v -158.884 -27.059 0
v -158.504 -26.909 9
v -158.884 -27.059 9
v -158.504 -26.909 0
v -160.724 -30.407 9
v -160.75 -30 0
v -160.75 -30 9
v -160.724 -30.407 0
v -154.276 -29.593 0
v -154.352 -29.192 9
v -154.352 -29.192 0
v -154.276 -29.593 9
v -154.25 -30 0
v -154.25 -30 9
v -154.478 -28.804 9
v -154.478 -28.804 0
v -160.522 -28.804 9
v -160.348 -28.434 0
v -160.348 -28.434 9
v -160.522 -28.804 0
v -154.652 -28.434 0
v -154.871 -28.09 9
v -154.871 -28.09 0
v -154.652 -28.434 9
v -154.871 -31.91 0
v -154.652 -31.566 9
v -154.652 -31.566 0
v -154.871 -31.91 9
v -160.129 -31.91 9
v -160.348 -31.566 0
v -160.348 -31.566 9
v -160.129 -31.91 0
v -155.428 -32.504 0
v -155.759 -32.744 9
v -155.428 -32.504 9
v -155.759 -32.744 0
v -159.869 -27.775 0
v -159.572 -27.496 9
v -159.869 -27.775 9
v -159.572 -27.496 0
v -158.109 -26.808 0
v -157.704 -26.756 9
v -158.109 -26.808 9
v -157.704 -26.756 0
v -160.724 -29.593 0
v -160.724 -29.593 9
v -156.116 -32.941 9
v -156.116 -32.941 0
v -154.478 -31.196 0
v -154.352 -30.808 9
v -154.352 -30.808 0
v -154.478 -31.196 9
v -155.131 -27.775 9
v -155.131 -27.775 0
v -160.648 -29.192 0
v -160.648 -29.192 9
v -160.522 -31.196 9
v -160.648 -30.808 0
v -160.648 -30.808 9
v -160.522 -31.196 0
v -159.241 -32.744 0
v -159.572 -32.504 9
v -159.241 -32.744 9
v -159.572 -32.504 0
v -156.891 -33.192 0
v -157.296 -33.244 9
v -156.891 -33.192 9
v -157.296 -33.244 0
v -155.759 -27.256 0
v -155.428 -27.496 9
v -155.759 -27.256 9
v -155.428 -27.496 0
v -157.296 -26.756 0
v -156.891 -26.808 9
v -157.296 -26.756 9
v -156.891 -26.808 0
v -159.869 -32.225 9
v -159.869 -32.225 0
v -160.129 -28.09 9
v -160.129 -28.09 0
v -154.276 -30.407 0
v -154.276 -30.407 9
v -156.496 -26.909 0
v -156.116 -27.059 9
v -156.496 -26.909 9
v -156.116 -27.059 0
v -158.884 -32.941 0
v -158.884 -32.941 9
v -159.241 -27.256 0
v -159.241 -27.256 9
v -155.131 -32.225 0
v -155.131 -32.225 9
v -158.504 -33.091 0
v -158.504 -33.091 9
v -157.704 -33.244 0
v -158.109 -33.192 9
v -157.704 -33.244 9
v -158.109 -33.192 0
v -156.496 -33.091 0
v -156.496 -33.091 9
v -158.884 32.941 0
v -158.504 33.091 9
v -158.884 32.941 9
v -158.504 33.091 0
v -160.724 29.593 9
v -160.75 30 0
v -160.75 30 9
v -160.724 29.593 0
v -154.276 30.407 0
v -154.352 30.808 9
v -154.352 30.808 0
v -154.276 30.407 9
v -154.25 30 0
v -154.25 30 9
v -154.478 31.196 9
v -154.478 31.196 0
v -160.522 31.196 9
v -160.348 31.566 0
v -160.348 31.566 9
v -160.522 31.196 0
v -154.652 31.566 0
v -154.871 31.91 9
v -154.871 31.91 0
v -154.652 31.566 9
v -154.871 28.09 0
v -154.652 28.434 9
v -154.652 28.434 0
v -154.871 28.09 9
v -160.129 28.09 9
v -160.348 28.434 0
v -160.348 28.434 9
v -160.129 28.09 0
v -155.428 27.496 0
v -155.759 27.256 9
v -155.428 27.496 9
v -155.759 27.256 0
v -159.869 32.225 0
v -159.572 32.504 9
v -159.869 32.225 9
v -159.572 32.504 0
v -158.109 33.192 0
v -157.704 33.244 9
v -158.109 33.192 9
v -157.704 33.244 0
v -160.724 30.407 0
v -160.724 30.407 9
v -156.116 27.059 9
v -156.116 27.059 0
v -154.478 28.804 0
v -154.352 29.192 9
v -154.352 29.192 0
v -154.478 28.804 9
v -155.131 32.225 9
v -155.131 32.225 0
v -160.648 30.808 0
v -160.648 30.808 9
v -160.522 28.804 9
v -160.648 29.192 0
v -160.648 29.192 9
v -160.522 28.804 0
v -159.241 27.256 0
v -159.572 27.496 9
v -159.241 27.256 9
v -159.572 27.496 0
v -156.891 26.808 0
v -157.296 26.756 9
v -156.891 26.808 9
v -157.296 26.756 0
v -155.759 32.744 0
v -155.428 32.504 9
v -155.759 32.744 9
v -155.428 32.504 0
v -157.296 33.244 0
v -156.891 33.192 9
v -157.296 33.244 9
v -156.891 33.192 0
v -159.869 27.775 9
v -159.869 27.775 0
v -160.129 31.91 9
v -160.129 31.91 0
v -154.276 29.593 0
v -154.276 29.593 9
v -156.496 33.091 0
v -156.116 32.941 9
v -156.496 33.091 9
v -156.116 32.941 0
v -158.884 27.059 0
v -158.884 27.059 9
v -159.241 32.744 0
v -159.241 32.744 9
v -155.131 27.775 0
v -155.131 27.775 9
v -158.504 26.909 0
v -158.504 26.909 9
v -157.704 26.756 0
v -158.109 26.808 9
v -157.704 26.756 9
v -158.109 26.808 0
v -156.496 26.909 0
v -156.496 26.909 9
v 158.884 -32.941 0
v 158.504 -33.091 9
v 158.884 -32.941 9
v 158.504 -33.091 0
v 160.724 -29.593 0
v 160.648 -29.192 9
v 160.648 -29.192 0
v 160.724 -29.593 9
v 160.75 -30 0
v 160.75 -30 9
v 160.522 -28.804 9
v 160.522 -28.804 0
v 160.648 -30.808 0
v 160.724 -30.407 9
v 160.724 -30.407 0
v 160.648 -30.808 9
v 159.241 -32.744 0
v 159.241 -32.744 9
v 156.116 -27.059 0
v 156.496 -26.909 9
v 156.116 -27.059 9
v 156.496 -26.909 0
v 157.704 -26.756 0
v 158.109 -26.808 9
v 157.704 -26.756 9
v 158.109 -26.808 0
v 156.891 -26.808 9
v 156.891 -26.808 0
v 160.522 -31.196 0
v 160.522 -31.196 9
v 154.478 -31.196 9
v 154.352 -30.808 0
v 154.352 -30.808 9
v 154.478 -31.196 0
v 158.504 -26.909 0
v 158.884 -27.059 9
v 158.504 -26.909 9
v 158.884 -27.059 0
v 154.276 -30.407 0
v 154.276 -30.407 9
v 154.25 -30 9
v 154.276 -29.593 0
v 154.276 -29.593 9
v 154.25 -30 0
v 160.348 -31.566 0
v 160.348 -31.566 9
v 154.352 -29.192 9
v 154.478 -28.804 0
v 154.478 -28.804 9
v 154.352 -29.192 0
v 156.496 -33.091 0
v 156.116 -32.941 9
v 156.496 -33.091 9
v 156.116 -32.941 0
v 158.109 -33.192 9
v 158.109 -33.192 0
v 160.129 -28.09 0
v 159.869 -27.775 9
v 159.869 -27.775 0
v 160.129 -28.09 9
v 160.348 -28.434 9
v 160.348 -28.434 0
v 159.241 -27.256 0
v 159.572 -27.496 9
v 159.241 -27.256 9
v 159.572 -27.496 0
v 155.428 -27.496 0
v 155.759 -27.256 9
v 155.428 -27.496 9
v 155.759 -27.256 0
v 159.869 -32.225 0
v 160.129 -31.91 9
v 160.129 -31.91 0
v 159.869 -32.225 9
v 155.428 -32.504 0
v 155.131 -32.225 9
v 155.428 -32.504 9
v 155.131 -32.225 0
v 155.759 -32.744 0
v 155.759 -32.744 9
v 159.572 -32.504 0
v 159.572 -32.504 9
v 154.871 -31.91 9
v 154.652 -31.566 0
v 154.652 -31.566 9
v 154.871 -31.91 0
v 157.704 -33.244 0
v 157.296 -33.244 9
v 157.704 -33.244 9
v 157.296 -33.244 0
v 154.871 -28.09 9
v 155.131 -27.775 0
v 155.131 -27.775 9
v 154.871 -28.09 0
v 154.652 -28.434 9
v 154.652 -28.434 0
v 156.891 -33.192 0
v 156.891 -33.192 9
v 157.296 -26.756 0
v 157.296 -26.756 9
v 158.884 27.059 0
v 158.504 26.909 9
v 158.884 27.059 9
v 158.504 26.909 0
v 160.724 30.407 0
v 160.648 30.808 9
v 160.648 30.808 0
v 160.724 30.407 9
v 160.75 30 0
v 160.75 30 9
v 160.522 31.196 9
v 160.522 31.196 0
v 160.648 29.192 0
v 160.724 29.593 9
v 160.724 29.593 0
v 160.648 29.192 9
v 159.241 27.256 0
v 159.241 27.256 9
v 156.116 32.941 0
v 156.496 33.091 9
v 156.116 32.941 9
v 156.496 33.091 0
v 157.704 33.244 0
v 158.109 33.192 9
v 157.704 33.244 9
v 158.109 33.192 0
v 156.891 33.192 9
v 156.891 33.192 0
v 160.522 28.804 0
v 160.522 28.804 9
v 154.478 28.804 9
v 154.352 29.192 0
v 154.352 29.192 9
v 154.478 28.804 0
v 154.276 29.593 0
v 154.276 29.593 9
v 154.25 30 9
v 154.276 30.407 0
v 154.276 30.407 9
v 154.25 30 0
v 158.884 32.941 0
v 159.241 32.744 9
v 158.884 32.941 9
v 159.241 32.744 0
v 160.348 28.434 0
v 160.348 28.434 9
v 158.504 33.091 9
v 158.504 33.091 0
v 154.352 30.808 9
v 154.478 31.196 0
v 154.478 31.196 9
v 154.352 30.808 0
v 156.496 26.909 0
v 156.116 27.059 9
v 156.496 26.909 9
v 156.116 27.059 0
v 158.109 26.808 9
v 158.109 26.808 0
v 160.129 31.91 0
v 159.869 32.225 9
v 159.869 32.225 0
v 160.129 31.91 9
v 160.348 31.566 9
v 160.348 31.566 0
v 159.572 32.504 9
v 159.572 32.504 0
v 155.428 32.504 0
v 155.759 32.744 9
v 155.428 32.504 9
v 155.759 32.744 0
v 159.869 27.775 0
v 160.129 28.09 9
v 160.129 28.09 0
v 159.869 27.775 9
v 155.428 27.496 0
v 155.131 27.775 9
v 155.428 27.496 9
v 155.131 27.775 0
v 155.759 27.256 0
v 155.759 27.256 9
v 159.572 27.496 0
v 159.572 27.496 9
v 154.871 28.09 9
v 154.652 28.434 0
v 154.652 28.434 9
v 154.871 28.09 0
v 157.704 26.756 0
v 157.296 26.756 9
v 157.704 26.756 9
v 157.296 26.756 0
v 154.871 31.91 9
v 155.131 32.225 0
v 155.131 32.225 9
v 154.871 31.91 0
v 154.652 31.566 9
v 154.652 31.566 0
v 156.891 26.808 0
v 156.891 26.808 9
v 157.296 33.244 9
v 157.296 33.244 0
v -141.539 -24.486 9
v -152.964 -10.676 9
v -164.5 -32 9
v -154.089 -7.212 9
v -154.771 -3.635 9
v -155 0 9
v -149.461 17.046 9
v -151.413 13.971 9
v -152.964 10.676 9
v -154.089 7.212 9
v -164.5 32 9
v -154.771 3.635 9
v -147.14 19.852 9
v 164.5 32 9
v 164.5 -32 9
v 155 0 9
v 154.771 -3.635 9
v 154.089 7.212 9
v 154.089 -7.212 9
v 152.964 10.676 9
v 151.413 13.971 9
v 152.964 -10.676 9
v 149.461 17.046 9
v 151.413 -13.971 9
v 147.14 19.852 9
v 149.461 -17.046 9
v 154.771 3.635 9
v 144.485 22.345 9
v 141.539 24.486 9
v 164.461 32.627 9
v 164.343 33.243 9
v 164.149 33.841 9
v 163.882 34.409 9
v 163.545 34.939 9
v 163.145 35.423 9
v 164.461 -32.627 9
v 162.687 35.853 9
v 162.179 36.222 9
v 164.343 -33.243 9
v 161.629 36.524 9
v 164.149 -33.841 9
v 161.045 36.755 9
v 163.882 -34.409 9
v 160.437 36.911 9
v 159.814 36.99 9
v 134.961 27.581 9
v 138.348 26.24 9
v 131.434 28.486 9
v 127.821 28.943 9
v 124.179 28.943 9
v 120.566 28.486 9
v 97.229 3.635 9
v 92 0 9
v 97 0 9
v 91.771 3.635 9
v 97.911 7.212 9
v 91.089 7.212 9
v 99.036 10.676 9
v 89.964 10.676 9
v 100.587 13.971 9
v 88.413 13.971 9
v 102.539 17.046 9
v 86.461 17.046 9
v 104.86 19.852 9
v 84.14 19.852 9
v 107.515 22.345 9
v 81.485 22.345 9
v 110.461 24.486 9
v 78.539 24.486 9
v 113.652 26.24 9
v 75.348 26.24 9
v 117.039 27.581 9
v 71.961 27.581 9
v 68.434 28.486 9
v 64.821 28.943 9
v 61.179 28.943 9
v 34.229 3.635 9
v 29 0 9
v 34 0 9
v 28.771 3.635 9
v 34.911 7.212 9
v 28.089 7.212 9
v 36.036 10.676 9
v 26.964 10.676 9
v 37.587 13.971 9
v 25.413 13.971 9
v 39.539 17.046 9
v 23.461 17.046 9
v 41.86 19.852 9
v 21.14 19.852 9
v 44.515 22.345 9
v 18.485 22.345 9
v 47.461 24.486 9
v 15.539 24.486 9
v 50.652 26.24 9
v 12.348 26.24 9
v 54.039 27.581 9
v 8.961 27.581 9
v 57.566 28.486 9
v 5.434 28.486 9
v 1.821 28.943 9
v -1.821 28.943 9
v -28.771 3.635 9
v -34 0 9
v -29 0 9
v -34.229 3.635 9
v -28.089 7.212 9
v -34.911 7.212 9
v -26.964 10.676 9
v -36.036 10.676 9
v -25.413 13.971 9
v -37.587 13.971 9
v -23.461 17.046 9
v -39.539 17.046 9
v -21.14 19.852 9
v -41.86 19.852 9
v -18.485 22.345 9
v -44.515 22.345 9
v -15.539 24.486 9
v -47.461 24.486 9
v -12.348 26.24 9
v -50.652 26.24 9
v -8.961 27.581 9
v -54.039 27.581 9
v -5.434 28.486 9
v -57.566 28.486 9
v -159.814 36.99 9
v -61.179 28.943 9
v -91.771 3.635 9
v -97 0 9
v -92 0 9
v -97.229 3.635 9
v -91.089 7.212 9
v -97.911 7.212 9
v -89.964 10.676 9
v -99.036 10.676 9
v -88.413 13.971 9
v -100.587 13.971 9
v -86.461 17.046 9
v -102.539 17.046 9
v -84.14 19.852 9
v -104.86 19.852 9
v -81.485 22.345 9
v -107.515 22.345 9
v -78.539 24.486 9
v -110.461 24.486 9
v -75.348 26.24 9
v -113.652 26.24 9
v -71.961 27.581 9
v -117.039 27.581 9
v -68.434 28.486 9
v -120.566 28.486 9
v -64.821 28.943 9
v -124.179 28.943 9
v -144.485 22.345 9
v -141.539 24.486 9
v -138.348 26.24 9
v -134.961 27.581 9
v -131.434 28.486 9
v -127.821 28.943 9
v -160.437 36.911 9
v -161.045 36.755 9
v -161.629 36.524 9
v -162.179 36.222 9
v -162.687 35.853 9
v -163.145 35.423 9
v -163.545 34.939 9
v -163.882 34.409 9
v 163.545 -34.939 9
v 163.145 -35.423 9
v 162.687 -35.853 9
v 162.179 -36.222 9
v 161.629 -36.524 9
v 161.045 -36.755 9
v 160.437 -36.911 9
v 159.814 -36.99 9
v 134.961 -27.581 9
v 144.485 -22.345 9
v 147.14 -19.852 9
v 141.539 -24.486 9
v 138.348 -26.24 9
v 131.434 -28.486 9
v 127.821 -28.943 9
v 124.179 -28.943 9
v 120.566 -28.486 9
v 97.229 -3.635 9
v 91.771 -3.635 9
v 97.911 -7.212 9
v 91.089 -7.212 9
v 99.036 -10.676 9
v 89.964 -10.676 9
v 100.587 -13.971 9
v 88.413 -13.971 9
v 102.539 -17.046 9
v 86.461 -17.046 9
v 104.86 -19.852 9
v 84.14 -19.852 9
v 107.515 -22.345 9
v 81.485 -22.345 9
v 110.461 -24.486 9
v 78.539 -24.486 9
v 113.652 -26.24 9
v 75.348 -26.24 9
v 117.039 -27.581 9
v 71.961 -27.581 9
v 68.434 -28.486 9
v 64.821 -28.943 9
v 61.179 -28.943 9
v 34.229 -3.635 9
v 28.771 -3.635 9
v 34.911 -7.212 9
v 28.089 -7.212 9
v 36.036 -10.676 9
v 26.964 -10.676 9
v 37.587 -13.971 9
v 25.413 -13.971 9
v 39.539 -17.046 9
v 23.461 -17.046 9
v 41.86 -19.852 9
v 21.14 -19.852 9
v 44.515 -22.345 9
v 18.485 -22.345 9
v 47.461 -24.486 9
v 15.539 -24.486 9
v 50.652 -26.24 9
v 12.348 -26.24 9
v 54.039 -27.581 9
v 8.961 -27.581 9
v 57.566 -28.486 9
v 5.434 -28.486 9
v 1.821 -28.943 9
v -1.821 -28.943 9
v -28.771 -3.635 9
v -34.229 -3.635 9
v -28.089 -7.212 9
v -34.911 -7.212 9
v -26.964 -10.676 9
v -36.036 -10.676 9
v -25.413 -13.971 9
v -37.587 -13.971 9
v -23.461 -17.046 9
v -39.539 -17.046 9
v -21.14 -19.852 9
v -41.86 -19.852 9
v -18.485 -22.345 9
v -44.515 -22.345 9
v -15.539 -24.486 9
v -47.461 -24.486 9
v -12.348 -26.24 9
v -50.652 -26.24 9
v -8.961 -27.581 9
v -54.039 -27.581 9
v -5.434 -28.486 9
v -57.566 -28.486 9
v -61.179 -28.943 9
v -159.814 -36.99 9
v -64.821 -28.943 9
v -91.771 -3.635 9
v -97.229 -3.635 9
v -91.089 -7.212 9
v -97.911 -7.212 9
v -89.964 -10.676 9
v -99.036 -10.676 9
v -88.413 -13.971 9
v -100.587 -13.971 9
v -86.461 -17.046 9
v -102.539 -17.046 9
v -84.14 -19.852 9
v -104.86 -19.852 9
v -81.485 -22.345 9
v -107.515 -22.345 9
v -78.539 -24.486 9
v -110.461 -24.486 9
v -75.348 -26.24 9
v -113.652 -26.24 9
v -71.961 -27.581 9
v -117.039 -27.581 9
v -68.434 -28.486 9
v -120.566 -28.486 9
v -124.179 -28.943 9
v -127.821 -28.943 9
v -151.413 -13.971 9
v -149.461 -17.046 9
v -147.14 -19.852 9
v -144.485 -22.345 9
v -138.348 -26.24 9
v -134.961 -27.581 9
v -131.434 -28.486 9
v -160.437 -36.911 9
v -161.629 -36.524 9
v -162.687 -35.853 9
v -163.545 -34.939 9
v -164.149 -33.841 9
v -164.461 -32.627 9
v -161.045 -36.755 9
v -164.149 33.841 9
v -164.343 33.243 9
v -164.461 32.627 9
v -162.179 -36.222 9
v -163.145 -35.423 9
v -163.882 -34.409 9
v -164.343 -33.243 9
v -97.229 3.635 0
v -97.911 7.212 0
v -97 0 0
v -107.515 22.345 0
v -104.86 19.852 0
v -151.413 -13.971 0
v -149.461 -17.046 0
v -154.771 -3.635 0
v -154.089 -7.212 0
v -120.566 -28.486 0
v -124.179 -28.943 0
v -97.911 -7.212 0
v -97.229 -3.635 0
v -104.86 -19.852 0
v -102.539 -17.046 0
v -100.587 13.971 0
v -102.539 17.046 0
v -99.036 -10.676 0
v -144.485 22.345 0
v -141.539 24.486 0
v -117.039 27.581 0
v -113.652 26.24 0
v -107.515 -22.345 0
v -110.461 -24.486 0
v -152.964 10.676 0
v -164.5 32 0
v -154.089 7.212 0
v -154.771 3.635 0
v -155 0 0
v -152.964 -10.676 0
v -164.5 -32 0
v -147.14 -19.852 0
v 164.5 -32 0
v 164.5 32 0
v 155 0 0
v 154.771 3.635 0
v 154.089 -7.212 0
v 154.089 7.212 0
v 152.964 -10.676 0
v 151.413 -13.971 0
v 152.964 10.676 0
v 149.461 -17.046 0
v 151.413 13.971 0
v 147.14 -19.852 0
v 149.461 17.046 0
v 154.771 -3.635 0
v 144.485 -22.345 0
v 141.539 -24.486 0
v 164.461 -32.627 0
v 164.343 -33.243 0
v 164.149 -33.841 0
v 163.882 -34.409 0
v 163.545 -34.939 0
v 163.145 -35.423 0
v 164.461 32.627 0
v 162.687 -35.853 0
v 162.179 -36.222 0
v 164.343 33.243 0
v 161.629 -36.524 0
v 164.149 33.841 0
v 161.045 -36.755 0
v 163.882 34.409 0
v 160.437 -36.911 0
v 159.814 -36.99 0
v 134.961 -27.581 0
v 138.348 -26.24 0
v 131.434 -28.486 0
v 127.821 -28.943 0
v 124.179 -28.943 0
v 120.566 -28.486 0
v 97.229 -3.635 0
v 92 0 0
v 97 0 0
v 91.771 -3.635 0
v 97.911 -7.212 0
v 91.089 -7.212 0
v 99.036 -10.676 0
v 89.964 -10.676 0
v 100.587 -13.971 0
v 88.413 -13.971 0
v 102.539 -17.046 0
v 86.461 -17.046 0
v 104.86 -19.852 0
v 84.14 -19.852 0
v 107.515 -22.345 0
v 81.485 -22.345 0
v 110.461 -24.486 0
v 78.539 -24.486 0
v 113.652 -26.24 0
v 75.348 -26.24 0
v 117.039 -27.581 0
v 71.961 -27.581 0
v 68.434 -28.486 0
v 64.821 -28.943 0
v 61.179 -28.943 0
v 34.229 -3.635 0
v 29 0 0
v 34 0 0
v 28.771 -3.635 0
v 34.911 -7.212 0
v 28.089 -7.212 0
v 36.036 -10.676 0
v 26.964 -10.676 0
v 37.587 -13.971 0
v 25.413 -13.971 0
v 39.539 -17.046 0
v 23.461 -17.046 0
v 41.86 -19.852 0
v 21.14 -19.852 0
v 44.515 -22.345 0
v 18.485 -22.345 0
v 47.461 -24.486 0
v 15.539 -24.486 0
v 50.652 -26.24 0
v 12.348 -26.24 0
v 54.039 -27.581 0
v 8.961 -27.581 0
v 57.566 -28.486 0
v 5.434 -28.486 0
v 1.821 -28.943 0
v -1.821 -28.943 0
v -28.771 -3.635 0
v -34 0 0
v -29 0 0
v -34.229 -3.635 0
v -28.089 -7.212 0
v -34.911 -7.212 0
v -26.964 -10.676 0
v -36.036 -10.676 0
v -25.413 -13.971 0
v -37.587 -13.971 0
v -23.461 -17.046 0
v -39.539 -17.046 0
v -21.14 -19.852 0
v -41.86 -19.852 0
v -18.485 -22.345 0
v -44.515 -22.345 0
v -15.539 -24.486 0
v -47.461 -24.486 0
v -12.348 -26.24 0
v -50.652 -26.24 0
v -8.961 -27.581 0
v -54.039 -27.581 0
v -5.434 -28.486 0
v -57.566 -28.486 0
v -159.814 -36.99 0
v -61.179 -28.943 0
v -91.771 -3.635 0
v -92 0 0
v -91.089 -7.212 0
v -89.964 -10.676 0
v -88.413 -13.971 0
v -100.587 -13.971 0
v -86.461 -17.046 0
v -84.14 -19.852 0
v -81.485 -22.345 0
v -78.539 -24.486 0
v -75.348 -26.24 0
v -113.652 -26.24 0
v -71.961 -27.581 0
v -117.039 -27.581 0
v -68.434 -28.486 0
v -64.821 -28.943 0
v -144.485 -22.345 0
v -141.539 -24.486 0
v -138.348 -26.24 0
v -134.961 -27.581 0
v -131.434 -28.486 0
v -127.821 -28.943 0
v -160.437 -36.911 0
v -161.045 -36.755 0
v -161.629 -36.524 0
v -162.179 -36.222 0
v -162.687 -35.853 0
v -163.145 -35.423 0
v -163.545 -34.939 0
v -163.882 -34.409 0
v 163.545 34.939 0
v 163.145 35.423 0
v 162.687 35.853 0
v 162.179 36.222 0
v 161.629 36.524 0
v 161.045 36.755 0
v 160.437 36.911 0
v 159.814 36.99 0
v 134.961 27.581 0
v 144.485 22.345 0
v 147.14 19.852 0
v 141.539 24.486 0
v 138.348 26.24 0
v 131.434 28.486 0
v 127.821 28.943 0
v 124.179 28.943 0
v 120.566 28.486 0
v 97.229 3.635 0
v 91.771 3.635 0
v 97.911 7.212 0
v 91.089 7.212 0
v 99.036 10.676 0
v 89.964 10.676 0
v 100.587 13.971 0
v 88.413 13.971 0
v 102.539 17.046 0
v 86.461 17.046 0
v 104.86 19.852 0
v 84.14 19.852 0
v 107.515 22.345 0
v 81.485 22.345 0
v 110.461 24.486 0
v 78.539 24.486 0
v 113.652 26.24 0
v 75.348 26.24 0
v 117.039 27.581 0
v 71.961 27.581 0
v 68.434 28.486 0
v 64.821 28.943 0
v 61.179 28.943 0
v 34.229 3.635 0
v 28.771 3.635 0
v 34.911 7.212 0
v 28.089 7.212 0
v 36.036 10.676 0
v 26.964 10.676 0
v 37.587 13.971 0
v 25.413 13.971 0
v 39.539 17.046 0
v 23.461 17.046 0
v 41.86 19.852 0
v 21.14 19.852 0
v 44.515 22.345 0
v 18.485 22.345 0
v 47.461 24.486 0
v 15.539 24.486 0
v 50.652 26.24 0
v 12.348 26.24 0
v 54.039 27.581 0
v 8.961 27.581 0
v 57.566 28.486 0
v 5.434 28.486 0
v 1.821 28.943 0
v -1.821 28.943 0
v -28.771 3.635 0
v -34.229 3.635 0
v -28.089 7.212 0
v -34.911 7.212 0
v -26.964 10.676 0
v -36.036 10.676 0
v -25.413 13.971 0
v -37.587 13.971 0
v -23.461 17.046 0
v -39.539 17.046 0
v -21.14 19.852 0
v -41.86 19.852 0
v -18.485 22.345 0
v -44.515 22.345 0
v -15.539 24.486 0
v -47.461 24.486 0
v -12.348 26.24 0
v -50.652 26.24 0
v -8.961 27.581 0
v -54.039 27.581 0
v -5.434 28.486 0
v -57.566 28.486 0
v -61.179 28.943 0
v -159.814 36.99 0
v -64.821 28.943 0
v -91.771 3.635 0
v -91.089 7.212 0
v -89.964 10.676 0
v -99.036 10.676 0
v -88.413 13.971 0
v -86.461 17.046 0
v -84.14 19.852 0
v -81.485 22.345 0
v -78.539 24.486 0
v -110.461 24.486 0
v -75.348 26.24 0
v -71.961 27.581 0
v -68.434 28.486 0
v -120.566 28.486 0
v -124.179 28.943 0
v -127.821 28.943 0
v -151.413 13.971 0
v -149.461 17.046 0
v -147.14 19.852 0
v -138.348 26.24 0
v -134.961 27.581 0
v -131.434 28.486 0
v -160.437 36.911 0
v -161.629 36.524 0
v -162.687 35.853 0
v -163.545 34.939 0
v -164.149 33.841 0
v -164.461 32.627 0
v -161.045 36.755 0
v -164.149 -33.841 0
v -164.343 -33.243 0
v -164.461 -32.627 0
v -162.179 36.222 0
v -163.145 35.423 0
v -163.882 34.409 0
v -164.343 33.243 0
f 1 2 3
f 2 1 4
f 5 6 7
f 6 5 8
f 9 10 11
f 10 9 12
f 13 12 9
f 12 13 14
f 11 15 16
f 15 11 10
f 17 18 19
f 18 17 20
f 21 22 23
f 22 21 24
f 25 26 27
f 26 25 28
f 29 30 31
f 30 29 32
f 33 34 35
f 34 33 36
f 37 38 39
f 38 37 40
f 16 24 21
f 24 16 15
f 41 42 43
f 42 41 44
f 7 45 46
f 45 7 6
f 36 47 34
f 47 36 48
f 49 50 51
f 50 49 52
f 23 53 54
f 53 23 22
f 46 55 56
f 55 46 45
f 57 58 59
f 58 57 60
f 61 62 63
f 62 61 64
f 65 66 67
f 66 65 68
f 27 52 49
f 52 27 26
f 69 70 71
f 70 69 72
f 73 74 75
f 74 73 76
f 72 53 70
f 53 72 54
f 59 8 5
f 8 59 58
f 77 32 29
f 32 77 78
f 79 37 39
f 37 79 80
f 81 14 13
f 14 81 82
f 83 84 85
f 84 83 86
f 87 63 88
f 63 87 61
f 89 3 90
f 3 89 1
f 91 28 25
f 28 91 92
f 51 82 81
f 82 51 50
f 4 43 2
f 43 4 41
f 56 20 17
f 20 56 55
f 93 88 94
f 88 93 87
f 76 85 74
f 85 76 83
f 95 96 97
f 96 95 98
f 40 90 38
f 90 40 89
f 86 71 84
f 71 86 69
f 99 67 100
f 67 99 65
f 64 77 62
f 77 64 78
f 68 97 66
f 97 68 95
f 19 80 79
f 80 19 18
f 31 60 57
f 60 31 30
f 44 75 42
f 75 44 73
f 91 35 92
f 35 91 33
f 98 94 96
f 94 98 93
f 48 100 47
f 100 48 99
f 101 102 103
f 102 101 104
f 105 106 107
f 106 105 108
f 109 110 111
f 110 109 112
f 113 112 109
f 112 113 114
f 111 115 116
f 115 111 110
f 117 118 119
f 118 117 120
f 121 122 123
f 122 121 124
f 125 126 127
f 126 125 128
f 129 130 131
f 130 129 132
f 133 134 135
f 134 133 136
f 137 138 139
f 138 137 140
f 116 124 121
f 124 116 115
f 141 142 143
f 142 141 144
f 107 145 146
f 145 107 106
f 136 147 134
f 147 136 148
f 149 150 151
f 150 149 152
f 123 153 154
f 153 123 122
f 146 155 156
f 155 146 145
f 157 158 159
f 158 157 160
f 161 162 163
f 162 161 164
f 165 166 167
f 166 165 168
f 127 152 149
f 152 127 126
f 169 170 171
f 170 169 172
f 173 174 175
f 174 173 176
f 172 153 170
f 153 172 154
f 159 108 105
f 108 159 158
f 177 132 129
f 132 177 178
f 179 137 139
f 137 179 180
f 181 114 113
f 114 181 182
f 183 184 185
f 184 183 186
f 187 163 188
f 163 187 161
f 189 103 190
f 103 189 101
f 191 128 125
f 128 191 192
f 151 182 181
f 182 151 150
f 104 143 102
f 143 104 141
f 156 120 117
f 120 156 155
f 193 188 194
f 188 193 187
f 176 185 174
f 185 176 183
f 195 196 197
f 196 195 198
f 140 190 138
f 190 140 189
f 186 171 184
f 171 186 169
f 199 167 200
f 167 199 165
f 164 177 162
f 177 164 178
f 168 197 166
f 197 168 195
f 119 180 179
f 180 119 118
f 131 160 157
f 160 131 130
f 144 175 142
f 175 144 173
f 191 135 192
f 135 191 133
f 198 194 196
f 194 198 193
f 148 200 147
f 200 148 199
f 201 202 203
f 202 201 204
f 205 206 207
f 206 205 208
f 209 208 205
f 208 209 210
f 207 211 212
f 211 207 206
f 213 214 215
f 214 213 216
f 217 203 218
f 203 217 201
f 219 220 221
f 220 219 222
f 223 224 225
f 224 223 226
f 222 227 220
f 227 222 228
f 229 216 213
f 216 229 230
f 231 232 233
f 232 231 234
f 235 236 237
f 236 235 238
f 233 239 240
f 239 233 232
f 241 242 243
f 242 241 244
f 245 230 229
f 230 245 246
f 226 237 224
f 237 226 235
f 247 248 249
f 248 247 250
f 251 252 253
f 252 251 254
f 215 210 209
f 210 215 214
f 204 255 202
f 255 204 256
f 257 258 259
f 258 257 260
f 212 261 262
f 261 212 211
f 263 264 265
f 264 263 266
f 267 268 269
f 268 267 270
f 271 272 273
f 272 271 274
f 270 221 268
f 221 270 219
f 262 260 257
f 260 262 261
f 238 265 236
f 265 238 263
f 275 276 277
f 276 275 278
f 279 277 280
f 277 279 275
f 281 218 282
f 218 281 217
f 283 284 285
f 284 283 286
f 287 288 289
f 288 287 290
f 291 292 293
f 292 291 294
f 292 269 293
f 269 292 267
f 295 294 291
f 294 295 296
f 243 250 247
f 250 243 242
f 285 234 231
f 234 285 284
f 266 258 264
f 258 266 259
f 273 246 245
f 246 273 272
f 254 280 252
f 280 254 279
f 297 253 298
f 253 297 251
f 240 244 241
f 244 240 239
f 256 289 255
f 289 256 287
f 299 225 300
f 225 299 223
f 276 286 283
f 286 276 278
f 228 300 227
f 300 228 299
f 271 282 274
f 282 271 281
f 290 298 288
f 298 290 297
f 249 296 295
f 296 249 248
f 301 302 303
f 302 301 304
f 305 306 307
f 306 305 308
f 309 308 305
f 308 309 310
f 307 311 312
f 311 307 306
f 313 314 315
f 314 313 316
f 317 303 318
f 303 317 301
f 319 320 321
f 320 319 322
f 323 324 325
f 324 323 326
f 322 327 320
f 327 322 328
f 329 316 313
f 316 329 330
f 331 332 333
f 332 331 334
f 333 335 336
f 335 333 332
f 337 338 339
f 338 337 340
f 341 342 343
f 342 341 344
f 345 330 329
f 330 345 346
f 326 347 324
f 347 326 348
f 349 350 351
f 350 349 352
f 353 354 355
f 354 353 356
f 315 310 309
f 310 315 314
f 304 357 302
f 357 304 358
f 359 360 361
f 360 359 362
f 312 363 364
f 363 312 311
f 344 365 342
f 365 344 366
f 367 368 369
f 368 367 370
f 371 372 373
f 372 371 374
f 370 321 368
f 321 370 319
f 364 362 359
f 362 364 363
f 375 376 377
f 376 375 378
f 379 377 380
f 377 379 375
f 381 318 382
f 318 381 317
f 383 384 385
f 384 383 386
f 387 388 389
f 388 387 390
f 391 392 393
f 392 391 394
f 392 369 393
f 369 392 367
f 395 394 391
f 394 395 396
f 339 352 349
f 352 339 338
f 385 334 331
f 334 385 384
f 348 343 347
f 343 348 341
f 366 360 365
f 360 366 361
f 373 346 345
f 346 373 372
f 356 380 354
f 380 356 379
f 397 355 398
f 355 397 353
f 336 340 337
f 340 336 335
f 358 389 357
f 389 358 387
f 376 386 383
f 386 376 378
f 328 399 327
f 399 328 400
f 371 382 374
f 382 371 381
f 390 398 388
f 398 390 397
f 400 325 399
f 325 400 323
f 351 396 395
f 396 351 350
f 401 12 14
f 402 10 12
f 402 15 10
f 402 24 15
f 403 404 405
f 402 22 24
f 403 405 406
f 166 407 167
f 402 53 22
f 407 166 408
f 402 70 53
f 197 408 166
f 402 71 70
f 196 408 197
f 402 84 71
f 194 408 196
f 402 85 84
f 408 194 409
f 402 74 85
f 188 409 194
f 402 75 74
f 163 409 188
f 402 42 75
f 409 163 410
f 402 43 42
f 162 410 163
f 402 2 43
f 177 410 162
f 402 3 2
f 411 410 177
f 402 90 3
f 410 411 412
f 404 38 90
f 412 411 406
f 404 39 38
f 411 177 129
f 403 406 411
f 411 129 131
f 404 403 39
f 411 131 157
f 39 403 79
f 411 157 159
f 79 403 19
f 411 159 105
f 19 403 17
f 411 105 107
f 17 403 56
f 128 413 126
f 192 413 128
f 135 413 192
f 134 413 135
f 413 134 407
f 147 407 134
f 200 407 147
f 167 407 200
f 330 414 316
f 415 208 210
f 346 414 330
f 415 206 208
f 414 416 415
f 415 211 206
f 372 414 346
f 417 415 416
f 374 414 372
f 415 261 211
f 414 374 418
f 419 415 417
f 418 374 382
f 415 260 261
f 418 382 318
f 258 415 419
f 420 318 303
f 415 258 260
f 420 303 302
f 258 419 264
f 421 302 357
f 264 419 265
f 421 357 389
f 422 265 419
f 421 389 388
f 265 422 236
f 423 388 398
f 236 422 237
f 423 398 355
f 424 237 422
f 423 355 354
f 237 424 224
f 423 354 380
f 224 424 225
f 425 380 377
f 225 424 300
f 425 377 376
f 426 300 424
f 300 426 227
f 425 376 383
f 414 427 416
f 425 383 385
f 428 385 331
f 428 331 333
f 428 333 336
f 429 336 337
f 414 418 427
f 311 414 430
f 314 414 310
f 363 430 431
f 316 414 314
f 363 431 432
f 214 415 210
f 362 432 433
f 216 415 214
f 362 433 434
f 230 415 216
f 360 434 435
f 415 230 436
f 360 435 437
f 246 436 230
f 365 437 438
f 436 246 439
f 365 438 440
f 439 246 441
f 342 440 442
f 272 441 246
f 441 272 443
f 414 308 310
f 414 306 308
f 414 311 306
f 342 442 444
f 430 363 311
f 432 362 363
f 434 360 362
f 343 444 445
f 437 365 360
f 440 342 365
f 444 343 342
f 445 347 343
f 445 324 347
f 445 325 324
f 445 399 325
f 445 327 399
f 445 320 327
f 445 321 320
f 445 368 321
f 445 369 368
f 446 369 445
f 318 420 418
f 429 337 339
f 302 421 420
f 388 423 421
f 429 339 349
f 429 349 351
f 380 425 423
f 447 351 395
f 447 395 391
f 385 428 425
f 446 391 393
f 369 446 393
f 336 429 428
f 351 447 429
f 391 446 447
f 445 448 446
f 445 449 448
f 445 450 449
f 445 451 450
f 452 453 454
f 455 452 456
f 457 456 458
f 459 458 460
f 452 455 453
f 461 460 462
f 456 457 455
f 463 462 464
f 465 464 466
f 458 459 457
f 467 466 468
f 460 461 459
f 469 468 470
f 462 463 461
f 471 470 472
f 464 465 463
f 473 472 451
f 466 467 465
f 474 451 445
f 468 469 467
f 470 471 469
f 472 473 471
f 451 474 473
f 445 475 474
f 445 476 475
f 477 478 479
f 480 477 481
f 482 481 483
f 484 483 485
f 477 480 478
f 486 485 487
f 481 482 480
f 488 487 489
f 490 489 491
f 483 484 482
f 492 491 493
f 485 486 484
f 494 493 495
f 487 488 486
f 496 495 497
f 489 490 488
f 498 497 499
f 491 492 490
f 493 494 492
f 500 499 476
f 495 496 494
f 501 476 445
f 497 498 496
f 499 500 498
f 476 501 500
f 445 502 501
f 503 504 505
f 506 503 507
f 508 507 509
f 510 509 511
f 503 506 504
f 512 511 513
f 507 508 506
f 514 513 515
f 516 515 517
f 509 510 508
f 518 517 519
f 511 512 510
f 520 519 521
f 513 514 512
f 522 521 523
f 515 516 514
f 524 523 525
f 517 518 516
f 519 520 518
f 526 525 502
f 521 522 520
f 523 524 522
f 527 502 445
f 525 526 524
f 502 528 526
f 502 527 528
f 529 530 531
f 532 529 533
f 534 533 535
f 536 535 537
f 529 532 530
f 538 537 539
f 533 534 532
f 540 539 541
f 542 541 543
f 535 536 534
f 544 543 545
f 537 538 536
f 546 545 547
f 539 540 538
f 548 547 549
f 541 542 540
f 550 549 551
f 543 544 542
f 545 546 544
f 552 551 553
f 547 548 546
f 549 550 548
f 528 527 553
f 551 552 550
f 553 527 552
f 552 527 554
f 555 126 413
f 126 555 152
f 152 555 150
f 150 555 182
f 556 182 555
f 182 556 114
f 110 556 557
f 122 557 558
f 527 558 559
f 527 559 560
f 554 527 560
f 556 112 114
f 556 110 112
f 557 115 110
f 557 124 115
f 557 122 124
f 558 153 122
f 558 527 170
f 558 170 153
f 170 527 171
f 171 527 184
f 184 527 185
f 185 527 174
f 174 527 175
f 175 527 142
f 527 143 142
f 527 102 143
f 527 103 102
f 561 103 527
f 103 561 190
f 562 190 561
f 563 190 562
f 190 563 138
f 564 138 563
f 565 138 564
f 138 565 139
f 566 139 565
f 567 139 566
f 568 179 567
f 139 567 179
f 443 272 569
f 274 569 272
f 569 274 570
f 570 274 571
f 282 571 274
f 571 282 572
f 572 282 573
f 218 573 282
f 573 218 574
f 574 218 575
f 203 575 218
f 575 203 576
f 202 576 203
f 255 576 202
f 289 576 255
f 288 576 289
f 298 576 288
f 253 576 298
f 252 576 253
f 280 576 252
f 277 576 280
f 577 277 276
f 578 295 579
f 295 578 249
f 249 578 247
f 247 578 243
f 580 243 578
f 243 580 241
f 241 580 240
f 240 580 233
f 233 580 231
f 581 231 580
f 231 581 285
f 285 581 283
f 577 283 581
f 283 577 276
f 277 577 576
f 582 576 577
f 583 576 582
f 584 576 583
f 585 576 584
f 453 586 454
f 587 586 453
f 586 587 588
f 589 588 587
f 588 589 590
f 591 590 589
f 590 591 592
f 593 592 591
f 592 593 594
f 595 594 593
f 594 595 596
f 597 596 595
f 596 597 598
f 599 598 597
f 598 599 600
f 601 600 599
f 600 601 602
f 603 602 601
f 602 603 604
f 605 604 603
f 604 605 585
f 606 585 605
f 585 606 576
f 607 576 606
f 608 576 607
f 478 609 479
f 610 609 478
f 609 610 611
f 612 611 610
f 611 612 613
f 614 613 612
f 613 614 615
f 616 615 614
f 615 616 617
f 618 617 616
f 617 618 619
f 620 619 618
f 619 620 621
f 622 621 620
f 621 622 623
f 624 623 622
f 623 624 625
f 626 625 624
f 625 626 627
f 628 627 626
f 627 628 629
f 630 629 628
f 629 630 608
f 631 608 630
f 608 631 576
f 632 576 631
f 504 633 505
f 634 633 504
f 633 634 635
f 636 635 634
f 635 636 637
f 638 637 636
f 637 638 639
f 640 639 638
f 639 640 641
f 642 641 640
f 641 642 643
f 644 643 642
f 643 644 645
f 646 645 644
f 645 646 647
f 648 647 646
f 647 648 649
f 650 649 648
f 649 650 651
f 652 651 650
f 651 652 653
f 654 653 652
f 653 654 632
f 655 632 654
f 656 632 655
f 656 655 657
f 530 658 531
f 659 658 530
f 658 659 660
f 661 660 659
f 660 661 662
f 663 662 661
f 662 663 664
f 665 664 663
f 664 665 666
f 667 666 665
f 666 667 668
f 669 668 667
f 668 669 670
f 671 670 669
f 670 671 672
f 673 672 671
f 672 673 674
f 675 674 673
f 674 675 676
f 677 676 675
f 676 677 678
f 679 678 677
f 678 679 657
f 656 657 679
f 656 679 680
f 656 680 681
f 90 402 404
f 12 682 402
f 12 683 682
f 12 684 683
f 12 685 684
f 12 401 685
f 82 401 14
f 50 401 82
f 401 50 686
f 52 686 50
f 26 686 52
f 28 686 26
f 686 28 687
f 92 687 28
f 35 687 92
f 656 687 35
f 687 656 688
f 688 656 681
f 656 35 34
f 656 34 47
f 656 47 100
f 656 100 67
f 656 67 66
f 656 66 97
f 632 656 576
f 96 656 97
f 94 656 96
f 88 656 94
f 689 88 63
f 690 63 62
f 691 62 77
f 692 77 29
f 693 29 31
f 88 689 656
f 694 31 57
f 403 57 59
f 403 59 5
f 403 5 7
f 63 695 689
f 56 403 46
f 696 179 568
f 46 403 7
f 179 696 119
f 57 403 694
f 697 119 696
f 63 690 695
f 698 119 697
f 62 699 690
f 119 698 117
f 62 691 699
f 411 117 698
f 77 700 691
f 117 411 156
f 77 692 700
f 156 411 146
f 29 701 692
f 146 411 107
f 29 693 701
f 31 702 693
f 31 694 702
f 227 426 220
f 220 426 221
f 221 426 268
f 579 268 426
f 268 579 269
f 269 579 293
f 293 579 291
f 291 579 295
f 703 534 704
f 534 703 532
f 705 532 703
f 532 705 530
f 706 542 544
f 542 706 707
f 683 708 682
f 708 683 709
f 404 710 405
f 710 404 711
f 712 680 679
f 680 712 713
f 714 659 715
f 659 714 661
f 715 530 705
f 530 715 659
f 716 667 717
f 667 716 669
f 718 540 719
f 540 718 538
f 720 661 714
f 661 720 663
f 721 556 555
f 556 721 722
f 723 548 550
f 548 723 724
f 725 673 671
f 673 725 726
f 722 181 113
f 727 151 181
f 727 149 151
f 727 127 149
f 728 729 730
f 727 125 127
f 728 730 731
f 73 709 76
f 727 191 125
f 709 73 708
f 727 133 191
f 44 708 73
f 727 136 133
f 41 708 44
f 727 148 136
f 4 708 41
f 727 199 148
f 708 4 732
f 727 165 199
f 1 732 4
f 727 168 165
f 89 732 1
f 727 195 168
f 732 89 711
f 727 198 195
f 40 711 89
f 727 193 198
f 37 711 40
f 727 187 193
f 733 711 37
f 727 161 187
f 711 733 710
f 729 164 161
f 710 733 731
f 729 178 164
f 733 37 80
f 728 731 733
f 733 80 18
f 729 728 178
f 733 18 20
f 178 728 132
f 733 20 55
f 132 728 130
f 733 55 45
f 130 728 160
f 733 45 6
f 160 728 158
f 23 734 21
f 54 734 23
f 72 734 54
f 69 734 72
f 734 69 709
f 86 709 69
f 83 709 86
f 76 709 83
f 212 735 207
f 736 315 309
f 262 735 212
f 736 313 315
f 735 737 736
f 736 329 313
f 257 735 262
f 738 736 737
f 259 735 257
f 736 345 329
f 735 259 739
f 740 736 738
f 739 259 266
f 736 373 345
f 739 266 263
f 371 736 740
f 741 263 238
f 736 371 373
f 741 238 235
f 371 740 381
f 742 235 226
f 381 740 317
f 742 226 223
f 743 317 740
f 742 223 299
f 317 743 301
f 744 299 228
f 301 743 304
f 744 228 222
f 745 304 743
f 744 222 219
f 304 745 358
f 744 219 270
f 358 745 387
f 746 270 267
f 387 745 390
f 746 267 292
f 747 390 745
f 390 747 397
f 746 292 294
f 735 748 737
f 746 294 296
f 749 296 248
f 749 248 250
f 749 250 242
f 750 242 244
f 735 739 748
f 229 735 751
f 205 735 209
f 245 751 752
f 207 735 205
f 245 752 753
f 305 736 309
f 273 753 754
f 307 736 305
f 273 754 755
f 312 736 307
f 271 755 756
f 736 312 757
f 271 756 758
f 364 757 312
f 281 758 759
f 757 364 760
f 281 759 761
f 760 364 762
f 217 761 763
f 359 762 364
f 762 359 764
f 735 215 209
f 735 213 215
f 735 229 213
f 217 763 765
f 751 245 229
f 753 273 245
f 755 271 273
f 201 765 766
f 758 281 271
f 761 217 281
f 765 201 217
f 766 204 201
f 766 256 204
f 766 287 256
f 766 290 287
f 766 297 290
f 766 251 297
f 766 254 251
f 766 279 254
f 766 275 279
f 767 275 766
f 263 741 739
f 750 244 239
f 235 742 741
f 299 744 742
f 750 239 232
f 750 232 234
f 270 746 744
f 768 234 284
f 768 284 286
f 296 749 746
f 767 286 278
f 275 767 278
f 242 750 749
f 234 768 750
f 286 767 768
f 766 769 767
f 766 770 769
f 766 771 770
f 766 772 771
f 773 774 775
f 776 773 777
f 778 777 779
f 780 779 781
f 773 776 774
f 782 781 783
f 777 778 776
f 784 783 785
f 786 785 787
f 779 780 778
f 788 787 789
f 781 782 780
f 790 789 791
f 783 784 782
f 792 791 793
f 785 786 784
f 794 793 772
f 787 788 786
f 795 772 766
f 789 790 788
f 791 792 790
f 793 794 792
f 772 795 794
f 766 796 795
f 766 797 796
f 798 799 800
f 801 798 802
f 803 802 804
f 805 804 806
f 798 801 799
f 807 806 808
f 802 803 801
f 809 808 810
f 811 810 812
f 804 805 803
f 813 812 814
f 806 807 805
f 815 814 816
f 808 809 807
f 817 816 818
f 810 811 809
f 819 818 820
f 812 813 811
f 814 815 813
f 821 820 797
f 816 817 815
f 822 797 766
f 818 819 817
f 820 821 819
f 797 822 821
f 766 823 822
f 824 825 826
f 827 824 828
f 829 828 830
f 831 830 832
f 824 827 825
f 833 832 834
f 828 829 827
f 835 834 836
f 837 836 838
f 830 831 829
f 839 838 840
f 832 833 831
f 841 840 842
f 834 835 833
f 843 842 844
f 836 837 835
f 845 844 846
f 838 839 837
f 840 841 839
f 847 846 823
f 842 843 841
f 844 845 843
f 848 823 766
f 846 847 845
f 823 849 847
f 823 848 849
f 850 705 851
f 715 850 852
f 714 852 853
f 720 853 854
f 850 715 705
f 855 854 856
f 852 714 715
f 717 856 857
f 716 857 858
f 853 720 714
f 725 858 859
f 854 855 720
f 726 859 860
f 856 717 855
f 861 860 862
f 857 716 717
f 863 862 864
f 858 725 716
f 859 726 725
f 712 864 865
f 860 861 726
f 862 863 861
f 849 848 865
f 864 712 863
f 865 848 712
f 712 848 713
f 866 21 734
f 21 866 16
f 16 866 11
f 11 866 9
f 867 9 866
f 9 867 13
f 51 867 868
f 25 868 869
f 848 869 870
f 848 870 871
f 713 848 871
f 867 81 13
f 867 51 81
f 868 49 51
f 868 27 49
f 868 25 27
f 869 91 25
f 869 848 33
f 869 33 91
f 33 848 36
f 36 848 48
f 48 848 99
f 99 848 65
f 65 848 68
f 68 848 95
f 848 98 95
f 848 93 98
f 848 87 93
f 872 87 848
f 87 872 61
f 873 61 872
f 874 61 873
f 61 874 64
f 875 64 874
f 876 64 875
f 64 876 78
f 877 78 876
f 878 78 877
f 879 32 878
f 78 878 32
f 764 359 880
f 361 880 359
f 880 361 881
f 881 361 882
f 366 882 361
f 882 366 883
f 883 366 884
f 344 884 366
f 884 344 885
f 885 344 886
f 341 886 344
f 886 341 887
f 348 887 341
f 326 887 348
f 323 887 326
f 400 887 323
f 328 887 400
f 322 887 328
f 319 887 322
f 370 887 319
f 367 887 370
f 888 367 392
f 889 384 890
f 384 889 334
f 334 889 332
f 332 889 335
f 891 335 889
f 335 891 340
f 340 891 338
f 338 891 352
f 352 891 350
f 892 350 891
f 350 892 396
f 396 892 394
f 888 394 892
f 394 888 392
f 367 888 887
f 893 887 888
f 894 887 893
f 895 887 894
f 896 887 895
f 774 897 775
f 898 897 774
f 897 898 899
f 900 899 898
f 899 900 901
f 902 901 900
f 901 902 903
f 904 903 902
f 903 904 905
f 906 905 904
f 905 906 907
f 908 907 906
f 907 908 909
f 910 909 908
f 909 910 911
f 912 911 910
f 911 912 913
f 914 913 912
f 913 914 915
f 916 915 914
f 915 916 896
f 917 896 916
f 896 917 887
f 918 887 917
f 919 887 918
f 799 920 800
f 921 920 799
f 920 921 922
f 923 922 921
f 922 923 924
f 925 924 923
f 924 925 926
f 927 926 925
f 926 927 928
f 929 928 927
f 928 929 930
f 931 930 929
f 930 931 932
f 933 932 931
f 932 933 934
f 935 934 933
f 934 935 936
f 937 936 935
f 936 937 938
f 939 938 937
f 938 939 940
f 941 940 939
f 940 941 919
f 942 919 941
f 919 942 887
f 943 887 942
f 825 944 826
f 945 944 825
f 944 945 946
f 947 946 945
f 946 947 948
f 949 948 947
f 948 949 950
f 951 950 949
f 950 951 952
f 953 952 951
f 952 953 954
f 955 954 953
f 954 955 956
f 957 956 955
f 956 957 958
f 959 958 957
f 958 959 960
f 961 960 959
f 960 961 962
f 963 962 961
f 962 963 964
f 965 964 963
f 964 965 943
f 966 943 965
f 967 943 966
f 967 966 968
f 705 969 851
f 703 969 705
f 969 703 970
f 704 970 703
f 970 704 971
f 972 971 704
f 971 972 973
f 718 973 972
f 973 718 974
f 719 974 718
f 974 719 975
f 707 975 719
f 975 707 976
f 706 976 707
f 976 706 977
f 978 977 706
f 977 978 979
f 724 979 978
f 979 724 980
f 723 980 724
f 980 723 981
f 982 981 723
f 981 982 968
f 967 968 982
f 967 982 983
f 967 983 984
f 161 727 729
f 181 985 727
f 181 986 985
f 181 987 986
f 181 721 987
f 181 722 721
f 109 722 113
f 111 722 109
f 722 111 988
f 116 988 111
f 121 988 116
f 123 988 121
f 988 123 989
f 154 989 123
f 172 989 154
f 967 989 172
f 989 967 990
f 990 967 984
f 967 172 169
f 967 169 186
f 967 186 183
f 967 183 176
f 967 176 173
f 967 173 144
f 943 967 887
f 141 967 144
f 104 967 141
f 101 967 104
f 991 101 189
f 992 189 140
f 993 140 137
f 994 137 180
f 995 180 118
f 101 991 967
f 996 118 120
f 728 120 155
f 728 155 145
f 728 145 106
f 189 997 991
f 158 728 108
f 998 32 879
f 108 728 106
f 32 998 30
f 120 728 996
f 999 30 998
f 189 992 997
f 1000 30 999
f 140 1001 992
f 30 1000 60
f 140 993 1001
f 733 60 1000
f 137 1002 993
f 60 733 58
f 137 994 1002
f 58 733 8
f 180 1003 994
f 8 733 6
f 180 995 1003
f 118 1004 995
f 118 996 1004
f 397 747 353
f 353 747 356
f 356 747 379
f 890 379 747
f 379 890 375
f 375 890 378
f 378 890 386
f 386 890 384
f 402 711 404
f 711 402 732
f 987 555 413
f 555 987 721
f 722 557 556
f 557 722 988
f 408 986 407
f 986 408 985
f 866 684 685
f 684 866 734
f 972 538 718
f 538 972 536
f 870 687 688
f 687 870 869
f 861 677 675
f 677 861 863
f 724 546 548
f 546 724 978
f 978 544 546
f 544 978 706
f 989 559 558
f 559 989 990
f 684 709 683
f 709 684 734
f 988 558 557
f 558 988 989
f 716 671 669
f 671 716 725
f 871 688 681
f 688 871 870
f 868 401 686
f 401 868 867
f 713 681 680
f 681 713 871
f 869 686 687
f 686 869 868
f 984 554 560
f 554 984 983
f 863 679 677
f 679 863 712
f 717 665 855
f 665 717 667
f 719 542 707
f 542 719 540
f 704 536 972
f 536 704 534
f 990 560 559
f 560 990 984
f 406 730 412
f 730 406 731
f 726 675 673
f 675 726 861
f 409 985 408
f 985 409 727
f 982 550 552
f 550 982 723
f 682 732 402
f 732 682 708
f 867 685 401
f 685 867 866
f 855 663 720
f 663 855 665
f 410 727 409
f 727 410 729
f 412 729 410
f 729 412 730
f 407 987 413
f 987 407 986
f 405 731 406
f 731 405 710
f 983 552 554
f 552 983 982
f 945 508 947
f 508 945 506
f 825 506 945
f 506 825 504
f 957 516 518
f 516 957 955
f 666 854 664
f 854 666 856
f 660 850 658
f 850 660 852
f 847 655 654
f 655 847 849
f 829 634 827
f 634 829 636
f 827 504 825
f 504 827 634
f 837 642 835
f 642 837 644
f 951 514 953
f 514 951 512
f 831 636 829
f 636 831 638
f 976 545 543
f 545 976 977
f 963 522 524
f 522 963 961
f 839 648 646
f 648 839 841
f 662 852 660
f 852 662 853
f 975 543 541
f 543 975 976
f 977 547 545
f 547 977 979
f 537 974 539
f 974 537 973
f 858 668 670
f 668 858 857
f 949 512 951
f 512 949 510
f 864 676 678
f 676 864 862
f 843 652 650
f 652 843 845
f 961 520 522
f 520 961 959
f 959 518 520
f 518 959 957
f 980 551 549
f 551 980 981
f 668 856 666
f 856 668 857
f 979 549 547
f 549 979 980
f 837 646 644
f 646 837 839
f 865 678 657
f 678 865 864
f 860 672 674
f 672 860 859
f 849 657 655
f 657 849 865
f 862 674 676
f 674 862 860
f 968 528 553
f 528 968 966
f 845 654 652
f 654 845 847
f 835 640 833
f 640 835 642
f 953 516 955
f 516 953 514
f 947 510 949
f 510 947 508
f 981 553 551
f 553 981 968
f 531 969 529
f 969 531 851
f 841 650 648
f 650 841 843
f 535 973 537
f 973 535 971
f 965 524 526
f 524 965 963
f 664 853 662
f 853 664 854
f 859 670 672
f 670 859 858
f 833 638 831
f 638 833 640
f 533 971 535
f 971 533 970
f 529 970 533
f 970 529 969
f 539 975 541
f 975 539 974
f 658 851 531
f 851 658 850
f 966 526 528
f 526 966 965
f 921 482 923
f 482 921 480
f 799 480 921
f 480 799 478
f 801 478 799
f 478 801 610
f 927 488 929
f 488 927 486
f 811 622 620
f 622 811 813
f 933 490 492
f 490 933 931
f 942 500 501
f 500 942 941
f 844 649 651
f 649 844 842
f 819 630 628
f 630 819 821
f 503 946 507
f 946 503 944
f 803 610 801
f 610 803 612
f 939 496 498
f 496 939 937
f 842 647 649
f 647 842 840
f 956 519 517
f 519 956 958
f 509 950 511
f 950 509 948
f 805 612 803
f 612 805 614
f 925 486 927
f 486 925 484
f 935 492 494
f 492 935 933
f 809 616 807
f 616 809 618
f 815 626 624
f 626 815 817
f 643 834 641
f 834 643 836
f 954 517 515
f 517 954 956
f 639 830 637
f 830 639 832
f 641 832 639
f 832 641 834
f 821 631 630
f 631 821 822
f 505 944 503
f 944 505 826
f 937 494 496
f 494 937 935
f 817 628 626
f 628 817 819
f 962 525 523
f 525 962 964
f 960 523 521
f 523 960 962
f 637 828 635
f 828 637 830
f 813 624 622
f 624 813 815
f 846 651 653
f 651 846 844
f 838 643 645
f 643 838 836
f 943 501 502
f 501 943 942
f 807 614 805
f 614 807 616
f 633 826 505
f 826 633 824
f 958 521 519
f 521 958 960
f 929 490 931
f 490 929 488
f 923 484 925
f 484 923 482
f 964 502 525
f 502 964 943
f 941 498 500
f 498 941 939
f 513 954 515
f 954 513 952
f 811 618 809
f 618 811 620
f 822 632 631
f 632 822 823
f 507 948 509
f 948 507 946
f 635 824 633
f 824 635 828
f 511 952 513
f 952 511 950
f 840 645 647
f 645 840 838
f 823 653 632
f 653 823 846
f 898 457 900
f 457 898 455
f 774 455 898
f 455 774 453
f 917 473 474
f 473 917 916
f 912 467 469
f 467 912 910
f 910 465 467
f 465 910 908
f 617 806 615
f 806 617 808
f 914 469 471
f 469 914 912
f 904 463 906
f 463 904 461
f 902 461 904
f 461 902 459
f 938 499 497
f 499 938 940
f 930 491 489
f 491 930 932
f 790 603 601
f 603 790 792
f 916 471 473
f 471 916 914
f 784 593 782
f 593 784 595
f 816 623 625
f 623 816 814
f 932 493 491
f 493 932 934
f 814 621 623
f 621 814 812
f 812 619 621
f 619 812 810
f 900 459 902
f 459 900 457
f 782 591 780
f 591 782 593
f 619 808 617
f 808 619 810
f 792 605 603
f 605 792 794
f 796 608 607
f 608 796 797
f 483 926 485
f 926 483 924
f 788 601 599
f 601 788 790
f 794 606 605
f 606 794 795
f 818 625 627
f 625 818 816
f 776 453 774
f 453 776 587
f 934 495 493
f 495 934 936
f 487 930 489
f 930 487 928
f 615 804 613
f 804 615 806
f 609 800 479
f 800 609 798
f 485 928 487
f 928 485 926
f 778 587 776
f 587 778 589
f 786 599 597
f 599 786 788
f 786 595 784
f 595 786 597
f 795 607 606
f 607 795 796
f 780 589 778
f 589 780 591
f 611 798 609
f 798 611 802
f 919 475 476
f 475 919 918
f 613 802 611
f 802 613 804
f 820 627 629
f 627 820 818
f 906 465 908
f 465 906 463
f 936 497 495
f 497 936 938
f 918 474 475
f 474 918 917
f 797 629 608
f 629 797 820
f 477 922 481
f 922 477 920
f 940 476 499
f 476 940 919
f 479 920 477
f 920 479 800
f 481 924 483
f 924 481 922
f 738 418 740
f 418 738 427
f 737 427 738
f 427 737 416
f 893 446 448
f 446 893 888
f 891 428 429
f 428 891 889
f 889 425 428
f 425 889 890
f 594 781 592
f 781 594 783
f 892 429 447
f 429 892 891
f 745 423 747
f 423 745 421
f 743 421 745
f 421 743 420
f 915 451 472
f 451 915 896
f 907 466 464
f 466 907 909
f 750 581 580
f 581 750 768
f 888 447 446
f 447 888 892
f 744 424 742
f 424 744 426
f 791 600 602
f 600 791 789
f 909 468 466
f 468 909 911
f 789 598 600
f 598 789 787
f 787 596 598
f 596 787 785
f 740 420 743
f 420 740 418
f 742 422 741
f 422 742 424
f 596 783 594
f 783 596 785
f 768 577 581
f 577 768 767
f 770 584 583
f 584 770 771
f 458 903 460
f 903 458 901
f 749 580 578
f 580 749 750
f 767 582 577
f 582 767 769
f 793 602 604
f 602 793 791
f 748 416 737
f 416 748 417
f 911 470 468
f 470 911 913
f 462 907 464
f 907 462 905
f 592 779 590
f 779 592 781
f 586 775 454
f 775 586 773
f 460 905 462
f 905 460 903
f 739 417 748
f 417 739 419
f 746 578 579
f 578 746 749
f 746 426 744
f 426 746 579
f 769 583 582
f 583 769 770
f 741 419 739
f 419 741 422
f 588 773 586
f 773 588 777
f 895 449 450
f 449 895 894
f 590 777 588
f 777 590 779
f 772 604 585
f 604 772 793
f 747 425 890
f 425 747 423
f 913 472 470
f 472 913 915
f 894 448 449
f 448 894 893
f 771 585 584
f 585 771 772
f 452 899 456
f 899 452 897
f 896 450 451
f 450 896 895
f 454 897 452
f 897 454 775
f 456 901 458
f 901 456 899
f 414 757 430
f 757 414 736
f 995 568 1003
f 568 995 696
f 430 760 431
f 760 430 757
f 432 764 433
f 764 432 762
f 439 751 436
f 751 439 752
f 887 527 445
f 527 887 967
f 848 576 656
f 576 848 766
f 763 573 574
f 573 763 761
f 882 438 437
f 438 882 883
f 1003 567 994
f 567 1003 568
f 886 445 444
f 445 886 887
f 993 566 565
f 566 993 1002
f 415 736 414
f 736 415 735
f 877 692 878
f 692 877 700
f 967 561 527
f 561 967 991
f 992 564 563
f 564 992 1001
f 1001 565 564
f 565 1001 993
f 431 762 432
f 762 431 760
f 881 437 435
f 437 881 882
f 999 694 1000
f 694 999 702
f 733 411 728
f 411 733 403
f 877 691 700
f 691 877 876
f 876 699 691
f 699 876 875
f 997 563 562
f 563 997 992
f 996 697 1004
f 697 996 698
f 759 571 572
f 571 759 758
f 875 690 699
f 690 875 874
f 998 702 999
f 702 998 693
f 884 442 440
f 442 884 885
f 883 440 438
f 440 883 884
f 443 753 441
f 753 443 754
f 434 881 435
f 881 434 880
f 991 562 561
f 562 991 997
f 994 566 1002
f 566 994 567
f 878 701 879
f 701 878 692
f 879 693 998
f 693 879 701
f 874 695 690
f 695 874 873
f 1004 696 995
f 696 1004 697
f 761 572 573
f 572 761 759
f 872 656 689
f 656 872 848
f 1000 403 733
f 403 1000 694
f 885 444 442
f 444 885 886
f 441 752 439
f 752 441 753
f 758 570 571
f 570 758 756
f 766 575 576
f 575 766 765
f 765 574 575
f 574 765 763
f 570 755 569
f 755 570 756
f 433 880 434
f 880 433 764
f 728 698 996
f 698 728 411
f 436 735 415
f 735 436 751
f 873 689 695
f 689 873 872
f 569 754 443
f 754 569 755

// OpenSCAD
$fn = 50;


difference() {
	union() {
		hull() {
			translate(v = [-159.5000000000, 32.0000000000, 0]) {
				cylinder(h = 9, r = 5);
			}
			translate(v = [159.5000000000, 32.0000000000, 0]) {
				cylinder(h = 9, r = 5);
			}
			translate(v = [-159.5000000000, -32.0000000000, 0]) {
				cylinder(h = 9, r = 5);
			}
			translate(v = [159.5000000000, -32.0000000000, 0]) {
				cylinder(h = 9, r = 5);
			}
		}
	}
	union() {
		#translate(v = [-157.5000000000, -30.0000000000, -100.0000000000]) {
			cylinder(h = 200, r = 3.2500000000);
		}
		#translate(v = [-157.5000000000, 30.0000000000, -100.0000000000]) {
			cylinder(h = 200, r = 3.2500000000);
		}
		#translate(v = [157.5000000000, -30.0000000000, -100.0000000000]) {
			cylinder(h = 200, r = 3.2500000000);
		}
		#translate(v = [157.5000000000, 30.0000000000, -100.0000000000]) {
			cylinder(h = 200, r = 3.2500000000);
		}
		#translate(v = [-126.0000000000, 0, 0]) {
			cylinder(h = 9, r = 29.0000000000);
		}
		#translate(v = [-63.0000000000, 0, 0]) {
			cylinder(h = 9, r = 29.0000000000);
		}
		#cylinder(h = 9, r = 29.0000000000);
		#translate(v = [63.0000000000, 0, 0]) {
			cylinder(h = 9, r = 29.0000000000);
		}
		#translate(v = [126.0000000000, 0, 0]) {
			cylinder(h = 9, r = 29.0000000000);
		}
	}
}
